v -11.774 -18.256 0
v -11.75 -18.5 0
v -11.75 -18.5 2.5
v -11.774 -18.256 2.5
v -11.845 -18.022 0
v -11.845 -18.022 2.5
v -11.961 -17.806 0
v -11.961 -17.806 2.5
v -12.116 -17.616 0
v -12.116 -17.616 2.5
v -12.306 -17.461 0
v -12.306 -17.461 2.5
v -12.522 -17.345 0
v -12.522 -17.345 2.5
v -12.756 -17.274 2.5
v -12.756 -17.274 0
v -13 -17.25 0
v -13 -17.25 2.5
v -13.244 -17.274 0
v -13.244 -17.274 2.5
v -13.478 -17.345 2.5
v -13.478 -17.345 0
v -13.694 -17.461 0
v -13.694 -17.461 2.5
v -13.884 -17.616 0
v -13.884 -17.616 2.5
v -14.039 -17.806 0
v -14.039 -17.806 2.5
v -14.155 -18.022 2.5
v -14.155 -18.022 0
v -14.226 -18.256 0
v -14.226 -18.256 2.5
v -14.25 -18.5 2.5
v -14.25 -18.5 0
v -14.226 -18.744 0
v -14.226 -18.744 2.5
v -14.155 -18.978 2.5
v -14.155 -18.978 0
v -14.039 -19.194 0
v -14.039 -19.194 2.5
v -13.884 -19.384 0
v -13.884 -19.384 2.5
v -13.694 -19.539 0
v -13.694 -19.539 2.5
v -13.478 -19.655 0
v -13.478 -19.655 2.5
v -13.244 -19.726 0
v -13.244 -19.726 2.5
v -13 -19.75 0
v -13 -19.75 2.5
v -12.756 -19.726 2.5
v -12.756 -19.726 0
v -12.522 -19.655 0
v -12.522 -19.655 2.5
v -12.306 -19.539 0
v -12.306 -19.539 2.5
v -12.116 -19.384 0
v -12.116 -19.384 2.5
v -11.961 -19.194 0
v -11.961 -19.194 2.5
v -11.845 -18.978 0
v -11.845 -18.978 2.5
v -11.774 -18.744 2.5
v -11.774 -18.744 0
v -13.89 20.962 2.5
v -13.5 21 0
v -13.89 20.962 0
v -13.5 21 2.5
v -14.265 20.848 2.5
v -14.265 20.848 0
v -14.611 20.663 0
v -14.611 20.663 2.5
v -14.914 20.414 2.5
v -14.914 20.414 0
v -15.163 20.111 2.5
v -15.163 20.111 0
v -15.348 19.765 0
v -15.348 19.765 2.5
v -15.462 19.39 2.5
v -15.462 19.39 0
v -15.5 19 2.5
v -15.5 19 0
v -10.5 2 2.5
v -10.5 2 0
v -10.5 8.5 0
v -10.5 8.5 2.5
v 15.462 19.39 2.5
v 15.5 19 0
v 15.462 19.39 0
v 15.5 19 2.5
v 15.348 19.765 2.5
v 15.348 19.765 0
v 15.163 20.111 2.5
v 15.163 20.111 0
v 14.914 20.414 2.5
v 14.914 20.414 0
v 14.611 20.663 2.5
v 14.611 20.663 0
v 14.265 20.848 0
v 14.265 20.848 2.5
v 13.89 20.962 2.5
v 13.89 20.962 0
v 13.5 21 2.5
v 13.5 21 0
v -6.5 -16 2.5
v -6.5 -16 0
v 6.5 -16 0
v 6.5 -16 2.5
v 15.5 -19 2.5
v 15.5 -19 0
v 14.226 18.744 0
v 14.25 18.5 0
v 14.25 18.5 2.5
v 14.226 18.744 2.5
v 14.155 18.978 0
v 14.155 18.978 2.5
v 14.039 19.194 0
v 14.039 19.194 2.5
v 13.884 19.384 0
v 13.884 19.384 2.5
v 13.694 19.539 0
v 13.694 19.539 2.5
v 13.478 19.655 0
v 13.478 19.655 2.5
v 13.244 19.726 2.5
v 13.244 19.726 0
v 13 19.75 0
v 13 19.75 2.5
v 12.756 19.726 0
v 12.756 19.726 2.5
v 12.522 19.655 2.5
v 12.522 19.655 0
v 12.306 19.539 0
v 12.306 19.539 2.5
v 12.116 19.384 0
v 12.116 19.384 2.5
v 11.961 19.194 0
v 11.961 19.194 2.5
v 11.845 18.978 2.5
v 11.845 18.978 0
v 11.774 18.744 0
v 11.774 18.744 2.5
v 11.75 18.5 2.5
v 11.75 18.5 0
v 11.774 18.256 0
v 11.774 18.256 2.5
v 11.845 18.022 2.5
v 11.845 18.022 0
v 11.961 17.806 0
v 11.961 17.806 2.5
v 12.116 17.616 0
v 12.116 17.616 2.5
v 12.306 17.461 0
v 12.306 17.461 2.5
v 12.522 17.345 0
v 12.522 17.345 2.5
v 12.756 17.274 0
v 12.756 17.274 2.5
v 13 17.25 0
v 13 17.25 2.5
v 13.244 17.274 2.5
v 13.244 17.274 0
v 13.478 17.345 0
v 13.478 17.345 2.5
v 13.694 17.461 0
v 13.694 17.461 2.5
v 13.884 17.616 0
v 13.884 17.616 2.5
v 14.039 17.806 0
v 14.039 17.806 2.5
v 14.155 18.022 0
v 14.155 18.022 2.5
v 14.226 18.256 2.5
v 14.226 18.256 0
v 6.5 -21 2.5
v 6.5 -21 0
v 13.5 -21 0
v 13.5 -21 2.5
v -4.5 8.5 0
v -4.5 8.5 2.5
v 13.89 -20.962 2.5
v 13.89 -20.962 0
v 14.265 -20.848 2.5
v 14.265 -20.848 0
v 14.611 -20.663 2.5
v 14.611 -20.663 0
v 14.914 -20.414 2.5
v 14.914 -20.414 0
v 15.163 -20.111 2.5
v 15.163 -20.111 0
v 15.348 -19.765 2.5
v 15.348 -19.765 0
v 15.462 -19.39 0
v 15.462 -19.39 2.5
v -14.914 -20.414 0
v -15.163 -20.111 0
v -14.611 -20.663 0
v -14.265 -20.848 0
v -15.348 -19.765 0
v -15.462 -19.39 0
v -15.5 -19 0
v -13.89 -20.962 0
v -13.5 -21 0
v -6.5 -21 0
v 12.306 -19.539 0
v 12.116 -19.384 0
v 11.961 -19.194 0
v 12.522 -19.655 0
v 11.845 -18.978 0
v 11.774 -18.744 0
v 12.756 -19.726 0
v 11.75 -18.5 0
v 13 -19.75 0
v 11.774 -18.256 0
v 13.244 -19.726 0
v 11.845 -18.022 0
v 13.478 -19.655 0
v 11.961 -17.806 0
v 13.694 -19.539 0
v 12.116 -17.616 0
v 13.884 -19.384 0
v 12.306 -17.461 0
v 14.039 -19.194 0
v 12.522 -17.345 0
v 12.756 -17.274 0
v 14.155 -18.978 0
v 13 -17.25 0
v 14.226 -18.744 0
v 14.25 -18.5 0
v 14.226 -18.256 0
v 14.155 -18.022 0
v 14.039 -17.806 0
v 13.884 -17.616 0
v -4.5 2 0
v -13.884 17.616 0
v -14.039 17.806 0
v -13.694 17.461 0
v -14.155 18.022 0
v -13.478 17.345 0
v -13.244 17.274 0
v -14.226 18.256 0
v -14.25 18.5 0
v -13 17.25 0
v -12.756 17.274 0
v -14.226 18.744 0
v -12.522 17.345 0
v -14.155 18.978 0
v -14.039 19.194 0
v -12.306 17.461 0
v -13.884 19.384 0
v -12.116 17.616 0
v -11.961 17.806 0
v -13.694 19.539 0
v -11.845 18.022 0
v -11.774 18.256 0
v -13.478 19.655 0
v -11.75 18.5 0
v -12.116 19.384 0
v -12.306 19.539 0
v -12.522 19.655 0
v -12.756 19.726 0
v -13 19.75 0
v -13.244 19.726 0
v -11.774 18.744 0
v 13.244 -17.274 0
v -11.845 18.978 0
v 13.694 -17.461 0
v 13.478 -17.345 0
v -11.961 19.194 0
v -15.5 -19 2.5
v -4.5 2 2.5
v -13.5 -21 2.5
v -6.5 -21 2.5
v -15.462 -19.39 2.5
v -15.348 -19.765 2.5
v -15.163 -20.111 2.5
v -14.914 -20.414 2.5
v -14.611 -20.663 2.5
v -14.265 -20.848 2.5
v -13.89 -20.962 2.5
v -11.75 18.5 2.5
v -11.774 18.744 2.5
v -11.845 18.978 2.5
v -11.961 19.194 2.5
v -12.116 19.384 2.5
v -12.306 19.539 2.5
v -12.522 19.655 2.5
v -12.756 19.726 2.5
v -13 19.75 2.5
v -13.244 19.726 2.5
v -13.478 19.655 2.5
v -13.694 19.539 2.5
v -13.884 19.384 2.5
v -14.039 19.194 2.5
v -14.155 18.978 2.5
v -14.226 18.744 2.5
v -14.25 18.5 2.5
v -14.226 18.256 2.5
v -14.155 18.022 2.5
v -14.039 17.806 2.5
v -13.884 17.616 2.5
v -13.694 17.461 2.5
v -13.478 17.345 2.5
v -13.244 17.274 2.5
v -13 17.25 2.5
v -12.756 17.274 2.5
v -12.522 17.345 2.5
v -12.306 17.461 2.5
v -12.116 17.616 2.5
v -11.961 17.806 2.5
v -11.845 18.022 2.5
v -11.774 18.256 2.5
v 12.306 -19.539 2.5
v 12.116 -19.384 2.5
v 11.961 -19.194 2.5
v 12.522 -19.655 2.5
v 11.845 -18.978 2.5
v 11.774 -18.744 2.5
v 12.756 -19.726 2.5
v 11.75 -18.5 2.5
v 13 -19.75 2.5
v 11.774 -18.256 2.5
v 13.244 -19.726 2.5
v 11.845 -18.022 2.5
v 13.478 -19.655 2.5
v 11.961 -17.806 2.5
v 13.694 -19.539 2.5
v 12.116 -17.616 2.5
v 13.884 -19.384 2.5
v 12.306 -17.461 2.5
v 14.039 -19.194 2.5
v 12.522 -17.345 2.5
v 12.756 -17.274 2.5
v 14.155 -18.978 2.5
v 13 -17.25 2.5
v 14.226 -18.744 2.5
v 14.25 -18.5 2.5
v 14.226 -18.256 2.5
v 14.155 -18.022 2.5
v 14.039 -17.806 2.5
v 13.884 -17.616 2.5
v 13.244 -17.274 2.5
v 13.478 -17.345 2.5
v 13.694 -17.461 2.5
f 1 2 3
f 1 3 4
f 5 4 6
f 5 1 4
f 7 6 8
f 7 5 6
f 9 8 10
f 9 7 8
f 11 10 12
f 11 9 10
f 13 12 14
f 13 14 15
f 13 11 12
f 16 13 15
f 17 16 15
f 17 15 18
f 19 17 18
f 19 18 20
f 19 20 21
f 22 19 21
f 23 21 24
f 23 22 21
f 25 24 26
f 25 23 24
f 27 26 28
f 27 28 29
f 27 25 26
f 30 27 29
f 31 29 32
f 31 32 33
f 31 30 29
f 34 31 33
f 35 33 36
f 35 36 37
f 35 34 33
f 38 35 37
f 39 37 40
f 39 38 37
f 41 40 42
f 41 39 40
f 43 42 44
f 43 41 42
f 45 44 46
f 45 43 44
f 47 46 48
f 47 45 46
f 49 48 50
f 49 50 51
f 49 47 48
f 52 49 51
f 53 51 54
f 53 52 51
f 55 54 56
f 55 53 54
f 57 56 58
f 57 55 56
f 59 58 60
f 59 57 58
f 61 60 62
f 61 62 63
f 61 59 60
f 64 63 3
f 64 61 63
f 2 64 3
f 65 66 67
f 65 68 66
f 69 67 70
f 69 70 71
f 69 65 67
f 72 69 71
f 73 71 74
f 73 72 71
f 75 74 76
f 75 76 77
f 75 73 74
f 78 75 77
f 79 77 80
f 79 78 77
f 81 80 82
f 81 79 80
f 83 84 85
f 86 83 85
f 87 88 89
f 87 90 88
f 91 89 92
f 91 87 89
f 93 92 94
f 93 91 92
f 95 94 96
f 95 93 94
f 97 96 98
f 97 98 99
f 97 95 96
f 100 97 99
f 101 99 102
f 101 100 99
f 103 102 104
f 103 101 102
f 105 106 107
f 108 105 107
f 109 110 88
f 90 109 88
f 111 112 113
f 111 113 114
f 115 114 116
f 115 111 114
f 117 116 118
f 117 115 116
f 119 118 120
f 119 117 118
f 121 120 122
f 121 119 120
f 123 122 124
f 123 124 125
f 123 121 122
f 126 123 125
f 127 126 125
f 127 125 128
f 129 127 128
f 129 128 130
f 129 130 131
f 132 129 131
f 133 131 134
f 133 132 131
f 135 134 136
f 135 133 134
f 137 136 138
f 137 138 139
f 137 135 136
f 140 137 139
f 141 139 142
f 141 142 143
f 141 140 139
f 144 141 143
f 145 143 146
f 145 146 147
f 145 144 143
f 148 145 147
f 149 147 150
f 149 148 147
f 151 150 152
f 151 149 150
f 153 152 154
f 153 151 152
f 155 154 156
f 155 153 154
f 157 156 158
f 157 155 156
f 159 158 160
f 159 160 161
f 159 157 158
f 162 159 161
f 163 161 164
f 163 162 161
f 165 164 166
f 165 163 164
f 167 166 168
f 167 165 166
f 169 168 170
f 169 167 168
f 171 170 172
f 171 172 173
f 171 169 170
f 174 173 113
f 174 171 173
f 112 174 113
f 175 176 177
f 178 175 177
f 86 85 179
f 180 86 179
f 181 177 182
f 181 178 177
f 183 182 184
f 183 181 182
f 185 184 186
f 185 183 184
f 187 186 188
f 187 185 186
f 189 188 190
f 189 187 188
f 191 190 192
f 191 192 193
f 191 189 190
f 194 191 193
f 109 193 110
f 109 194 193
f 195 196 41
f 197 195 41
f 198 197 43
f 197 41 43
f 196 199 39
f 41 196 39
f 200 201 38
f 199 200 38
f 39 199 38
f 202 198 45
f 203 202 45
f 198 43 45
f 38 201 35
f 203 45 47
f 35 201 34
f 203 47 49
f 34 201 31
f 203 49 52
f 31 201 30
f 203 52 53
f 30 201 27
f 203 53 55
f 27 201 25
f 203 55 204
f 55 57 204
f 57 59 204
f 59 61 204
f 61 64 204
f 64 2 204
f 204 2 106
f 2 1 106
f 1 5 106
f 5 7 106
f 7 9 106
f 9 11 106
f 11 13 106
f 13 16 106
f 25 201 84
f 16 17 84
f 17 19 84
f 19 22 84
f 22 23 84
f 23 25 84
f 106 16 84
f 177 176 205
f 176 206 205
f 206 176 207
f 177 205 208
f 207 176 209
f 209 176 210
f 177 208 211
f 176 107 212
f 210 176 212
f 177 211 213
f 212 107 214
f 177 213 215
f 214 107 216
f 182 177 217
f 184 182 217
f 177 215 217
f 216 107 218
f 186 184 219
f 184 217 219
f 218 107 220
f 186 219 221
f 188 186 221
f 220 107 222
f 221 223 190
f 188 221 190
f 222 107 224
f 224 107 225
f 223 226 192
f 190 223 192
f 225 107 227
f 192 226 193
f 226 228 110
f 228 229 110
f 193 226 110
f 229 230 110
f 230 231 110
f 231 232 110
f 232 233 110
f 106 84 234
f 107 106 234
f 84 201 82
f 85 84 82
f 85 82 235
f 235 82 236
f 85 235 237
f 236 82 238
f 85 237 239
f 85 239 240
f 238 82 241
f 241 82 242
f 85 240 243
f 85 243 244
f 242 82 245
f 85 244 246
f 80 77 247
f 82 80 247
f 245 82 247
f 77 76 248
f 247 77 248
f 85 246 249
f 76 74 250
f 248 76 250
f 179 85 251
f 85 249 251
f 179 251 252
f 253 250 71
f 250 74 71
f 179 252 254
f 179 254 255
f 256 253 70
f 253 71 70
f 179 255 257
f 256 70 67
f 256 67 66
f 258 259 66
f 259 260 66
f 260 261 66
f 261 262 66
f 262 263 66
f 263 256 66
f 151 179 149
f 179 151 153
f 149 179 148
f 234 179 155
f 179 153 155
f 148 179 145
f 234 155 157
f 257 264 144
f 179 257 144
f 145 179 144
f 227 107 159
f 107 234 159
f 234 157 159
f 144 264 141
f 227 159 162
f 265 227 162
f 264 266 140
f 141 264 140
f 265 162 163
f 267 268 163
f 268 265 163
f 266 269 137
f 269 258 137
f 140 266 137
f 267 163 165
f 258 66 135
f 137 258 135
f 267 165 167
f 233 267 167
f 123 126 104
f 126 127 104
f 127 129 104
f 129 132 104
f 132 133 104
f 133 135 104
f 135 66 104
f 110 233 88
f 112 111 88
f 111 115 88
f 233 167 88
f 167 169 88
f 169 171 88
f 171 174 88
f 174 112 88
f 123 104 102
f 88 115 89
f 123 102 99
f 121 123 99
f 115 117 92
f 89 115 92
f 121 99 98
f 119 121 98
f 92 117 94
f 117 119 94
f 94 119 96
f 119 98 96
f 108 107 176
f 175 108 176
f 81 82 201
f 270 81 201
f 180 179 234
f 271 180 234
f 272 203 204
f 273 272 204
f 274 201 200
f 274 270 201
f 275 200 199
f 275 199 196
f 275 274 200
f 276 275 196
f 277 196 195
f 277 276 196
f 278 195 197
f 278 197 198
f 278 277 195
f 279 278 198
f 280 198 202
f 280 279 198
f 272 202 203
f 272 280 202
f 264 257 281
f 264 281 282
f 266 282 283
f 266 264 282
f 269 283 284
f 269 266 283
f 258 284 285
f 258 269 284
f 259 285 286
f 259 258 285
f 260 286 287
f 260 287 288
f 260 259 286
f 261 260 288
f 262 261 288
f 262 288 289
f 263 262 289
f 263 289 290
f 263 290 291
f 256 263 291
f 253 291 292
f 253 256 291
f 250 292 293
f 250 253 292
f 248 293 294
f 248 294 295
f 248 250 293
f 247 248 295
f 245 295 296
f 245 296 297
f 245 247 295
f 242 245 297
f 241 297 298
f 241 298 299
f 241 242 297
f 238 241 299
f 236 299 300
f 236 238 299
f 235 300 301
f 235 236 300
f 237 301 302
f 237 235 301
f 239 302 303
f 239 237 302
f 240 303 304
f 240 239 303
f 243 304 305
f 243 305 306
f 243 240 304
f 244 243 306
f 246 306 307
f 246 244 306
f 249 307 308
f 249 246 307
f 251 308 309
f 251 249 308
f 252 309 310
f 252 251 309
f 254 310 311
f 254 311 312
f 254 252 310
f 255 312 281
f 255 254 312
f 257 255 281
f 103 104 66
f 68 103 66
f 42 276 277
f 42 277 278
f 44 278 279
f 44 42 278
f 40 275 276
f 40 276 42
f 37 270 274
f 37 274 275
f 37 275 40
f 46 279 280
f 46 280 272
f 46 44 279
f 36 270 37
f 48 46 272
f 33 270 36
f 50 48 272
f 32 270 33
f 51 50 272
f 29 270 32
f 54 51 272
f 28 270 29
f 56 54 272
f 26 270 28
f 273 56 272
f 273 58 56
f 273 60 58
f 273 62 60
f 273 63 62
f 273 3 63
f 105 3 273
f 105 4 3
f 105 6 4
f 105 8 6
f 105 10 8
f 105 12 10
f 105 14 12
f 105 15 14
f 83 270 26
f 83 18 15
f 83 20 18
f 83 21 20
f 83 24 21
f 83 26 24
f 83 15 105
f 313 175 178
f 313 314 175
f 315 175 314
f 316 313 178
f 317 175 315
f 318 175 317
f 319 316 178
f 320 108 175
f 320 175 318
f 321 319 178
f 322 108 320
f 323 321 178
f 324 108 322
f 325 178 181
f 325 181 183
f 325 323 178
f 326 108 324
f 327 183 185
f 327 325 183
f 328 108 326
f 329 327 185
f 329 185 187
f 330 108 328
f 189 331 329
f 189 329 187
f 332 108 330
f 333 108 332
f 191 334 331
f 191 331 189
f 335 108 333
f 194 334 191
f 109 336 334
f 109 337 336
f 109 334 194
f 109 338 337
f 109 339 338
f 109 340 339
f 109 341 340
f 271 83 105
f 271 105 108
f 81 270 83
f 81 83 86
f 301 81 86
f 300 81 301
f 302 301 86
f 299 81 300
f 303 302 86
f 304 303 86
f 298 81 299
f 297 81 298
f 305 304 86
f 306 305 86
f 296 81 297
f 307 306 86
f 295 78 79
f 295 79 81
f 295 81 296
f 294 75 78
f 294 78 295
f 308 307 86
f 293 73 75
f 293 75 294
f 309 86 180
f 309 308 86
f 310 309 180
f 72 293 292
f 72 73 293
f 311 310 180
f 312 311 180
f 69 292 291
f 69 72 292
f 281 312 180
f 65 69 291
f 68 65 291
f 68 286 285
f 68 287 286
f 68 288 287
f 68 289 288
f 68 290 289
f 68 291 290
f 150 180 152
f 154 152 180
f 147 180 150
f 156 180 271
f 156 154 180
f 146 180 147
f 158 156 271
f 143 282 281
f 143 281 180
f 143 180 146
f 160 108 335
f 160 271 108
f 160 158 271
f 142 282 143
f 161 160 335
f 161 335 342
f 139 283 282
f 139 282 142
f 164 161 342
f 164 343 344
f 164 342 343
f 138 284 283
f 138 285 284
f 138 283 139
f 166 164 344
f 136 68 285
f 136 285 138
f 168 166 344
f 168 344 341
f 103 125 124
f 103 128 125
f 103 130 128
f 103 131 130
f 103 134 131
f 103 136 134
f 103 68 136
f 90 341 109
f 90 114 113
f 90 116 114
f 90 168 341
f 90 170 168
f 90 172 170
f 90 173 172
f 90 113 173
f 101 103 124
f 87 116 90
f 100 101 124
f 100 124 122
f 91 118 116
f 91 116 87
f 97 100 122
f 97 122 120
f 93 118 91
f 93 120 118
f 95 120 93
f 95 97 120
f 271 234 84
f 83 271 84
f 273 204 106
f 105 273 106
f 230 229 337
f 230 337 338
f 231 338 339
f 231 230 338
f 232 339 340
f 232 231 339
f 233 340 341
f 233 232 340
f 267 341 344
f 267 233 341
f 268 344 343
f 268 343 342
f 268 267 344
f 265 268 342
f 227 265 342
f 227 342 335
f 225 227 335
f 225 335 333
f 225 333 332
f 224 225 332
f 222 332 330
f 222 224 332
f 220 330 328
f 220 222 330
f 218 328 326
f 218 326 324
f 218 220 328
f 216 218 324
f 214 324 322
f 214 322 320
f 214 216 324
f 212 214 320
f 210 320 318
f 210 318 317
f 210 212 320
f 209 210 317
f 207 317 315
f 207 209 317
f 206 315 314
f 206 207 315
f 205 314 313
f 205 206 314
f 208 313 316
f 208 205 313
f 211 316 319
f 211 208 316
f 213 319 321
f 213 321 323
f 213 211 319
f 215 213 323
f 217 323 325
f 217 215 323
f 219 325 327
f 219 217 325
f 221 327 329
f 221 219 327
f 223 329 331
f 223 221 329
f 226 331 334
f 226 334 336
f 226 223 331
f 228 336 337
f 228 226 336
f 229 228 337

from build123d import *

# Parameters (mm, degrees)
F0_R     = 1.25
F1_DEPTH = 2.5
F2_R     = 2


with BuildPart() as f1:
    # F0 (on Top) → F1 (new body)
    with BuildSketch(Plane.XY):
        Polygon((10.5, 16), (10.5, -16), (6.5, -16), (6.5, -21), (15.5, -21), (15.5, 21), (-15.5, 21), (-15.5, -21), (-6.5, -21), (-6.5, -16), (-10.5, -16), (-10.5, 2), (-10.5, 8.5), (-10.5, 16), align=None)
        with Locations((-13, -18.5)):
            Circle(F0_R, mode=Mode.SUBTRACT)
        with Locations((13, -18.5)):
            Circle(F0_R, mode=Mode.SUBTRACT)
        with Locations((-13, 18.5)):
            Circle(F0_R, mode=Mode.SUBTRACT)
        with Locations((13, 18.5)):
            Circle(F0_R, mode=Mode.SUBTRACT)
        Polygon((6.5, -16), (10.5, -16), (10.5, 16), (-10.5, 16), (-10.5, 8.5), (-4.5, 8.5), (-4.5, 2), (-10.5, 2), (-10.5, -16), (-6.5, -16), align=None)
    extrude(amount=F1_DEPTH)

    # F2
    f2_edges = [f1.edges().sort_by_distance(p)[0] for p in [
        (-15.5, 21, 1.25),
        (15.5, 21, 1.25),
        (15.5, -21, 1.25),
        (-15.5, -21, 1.25),
    ]]
    fillet(f2_edges, radius=F2_R)


solid = f1.part
